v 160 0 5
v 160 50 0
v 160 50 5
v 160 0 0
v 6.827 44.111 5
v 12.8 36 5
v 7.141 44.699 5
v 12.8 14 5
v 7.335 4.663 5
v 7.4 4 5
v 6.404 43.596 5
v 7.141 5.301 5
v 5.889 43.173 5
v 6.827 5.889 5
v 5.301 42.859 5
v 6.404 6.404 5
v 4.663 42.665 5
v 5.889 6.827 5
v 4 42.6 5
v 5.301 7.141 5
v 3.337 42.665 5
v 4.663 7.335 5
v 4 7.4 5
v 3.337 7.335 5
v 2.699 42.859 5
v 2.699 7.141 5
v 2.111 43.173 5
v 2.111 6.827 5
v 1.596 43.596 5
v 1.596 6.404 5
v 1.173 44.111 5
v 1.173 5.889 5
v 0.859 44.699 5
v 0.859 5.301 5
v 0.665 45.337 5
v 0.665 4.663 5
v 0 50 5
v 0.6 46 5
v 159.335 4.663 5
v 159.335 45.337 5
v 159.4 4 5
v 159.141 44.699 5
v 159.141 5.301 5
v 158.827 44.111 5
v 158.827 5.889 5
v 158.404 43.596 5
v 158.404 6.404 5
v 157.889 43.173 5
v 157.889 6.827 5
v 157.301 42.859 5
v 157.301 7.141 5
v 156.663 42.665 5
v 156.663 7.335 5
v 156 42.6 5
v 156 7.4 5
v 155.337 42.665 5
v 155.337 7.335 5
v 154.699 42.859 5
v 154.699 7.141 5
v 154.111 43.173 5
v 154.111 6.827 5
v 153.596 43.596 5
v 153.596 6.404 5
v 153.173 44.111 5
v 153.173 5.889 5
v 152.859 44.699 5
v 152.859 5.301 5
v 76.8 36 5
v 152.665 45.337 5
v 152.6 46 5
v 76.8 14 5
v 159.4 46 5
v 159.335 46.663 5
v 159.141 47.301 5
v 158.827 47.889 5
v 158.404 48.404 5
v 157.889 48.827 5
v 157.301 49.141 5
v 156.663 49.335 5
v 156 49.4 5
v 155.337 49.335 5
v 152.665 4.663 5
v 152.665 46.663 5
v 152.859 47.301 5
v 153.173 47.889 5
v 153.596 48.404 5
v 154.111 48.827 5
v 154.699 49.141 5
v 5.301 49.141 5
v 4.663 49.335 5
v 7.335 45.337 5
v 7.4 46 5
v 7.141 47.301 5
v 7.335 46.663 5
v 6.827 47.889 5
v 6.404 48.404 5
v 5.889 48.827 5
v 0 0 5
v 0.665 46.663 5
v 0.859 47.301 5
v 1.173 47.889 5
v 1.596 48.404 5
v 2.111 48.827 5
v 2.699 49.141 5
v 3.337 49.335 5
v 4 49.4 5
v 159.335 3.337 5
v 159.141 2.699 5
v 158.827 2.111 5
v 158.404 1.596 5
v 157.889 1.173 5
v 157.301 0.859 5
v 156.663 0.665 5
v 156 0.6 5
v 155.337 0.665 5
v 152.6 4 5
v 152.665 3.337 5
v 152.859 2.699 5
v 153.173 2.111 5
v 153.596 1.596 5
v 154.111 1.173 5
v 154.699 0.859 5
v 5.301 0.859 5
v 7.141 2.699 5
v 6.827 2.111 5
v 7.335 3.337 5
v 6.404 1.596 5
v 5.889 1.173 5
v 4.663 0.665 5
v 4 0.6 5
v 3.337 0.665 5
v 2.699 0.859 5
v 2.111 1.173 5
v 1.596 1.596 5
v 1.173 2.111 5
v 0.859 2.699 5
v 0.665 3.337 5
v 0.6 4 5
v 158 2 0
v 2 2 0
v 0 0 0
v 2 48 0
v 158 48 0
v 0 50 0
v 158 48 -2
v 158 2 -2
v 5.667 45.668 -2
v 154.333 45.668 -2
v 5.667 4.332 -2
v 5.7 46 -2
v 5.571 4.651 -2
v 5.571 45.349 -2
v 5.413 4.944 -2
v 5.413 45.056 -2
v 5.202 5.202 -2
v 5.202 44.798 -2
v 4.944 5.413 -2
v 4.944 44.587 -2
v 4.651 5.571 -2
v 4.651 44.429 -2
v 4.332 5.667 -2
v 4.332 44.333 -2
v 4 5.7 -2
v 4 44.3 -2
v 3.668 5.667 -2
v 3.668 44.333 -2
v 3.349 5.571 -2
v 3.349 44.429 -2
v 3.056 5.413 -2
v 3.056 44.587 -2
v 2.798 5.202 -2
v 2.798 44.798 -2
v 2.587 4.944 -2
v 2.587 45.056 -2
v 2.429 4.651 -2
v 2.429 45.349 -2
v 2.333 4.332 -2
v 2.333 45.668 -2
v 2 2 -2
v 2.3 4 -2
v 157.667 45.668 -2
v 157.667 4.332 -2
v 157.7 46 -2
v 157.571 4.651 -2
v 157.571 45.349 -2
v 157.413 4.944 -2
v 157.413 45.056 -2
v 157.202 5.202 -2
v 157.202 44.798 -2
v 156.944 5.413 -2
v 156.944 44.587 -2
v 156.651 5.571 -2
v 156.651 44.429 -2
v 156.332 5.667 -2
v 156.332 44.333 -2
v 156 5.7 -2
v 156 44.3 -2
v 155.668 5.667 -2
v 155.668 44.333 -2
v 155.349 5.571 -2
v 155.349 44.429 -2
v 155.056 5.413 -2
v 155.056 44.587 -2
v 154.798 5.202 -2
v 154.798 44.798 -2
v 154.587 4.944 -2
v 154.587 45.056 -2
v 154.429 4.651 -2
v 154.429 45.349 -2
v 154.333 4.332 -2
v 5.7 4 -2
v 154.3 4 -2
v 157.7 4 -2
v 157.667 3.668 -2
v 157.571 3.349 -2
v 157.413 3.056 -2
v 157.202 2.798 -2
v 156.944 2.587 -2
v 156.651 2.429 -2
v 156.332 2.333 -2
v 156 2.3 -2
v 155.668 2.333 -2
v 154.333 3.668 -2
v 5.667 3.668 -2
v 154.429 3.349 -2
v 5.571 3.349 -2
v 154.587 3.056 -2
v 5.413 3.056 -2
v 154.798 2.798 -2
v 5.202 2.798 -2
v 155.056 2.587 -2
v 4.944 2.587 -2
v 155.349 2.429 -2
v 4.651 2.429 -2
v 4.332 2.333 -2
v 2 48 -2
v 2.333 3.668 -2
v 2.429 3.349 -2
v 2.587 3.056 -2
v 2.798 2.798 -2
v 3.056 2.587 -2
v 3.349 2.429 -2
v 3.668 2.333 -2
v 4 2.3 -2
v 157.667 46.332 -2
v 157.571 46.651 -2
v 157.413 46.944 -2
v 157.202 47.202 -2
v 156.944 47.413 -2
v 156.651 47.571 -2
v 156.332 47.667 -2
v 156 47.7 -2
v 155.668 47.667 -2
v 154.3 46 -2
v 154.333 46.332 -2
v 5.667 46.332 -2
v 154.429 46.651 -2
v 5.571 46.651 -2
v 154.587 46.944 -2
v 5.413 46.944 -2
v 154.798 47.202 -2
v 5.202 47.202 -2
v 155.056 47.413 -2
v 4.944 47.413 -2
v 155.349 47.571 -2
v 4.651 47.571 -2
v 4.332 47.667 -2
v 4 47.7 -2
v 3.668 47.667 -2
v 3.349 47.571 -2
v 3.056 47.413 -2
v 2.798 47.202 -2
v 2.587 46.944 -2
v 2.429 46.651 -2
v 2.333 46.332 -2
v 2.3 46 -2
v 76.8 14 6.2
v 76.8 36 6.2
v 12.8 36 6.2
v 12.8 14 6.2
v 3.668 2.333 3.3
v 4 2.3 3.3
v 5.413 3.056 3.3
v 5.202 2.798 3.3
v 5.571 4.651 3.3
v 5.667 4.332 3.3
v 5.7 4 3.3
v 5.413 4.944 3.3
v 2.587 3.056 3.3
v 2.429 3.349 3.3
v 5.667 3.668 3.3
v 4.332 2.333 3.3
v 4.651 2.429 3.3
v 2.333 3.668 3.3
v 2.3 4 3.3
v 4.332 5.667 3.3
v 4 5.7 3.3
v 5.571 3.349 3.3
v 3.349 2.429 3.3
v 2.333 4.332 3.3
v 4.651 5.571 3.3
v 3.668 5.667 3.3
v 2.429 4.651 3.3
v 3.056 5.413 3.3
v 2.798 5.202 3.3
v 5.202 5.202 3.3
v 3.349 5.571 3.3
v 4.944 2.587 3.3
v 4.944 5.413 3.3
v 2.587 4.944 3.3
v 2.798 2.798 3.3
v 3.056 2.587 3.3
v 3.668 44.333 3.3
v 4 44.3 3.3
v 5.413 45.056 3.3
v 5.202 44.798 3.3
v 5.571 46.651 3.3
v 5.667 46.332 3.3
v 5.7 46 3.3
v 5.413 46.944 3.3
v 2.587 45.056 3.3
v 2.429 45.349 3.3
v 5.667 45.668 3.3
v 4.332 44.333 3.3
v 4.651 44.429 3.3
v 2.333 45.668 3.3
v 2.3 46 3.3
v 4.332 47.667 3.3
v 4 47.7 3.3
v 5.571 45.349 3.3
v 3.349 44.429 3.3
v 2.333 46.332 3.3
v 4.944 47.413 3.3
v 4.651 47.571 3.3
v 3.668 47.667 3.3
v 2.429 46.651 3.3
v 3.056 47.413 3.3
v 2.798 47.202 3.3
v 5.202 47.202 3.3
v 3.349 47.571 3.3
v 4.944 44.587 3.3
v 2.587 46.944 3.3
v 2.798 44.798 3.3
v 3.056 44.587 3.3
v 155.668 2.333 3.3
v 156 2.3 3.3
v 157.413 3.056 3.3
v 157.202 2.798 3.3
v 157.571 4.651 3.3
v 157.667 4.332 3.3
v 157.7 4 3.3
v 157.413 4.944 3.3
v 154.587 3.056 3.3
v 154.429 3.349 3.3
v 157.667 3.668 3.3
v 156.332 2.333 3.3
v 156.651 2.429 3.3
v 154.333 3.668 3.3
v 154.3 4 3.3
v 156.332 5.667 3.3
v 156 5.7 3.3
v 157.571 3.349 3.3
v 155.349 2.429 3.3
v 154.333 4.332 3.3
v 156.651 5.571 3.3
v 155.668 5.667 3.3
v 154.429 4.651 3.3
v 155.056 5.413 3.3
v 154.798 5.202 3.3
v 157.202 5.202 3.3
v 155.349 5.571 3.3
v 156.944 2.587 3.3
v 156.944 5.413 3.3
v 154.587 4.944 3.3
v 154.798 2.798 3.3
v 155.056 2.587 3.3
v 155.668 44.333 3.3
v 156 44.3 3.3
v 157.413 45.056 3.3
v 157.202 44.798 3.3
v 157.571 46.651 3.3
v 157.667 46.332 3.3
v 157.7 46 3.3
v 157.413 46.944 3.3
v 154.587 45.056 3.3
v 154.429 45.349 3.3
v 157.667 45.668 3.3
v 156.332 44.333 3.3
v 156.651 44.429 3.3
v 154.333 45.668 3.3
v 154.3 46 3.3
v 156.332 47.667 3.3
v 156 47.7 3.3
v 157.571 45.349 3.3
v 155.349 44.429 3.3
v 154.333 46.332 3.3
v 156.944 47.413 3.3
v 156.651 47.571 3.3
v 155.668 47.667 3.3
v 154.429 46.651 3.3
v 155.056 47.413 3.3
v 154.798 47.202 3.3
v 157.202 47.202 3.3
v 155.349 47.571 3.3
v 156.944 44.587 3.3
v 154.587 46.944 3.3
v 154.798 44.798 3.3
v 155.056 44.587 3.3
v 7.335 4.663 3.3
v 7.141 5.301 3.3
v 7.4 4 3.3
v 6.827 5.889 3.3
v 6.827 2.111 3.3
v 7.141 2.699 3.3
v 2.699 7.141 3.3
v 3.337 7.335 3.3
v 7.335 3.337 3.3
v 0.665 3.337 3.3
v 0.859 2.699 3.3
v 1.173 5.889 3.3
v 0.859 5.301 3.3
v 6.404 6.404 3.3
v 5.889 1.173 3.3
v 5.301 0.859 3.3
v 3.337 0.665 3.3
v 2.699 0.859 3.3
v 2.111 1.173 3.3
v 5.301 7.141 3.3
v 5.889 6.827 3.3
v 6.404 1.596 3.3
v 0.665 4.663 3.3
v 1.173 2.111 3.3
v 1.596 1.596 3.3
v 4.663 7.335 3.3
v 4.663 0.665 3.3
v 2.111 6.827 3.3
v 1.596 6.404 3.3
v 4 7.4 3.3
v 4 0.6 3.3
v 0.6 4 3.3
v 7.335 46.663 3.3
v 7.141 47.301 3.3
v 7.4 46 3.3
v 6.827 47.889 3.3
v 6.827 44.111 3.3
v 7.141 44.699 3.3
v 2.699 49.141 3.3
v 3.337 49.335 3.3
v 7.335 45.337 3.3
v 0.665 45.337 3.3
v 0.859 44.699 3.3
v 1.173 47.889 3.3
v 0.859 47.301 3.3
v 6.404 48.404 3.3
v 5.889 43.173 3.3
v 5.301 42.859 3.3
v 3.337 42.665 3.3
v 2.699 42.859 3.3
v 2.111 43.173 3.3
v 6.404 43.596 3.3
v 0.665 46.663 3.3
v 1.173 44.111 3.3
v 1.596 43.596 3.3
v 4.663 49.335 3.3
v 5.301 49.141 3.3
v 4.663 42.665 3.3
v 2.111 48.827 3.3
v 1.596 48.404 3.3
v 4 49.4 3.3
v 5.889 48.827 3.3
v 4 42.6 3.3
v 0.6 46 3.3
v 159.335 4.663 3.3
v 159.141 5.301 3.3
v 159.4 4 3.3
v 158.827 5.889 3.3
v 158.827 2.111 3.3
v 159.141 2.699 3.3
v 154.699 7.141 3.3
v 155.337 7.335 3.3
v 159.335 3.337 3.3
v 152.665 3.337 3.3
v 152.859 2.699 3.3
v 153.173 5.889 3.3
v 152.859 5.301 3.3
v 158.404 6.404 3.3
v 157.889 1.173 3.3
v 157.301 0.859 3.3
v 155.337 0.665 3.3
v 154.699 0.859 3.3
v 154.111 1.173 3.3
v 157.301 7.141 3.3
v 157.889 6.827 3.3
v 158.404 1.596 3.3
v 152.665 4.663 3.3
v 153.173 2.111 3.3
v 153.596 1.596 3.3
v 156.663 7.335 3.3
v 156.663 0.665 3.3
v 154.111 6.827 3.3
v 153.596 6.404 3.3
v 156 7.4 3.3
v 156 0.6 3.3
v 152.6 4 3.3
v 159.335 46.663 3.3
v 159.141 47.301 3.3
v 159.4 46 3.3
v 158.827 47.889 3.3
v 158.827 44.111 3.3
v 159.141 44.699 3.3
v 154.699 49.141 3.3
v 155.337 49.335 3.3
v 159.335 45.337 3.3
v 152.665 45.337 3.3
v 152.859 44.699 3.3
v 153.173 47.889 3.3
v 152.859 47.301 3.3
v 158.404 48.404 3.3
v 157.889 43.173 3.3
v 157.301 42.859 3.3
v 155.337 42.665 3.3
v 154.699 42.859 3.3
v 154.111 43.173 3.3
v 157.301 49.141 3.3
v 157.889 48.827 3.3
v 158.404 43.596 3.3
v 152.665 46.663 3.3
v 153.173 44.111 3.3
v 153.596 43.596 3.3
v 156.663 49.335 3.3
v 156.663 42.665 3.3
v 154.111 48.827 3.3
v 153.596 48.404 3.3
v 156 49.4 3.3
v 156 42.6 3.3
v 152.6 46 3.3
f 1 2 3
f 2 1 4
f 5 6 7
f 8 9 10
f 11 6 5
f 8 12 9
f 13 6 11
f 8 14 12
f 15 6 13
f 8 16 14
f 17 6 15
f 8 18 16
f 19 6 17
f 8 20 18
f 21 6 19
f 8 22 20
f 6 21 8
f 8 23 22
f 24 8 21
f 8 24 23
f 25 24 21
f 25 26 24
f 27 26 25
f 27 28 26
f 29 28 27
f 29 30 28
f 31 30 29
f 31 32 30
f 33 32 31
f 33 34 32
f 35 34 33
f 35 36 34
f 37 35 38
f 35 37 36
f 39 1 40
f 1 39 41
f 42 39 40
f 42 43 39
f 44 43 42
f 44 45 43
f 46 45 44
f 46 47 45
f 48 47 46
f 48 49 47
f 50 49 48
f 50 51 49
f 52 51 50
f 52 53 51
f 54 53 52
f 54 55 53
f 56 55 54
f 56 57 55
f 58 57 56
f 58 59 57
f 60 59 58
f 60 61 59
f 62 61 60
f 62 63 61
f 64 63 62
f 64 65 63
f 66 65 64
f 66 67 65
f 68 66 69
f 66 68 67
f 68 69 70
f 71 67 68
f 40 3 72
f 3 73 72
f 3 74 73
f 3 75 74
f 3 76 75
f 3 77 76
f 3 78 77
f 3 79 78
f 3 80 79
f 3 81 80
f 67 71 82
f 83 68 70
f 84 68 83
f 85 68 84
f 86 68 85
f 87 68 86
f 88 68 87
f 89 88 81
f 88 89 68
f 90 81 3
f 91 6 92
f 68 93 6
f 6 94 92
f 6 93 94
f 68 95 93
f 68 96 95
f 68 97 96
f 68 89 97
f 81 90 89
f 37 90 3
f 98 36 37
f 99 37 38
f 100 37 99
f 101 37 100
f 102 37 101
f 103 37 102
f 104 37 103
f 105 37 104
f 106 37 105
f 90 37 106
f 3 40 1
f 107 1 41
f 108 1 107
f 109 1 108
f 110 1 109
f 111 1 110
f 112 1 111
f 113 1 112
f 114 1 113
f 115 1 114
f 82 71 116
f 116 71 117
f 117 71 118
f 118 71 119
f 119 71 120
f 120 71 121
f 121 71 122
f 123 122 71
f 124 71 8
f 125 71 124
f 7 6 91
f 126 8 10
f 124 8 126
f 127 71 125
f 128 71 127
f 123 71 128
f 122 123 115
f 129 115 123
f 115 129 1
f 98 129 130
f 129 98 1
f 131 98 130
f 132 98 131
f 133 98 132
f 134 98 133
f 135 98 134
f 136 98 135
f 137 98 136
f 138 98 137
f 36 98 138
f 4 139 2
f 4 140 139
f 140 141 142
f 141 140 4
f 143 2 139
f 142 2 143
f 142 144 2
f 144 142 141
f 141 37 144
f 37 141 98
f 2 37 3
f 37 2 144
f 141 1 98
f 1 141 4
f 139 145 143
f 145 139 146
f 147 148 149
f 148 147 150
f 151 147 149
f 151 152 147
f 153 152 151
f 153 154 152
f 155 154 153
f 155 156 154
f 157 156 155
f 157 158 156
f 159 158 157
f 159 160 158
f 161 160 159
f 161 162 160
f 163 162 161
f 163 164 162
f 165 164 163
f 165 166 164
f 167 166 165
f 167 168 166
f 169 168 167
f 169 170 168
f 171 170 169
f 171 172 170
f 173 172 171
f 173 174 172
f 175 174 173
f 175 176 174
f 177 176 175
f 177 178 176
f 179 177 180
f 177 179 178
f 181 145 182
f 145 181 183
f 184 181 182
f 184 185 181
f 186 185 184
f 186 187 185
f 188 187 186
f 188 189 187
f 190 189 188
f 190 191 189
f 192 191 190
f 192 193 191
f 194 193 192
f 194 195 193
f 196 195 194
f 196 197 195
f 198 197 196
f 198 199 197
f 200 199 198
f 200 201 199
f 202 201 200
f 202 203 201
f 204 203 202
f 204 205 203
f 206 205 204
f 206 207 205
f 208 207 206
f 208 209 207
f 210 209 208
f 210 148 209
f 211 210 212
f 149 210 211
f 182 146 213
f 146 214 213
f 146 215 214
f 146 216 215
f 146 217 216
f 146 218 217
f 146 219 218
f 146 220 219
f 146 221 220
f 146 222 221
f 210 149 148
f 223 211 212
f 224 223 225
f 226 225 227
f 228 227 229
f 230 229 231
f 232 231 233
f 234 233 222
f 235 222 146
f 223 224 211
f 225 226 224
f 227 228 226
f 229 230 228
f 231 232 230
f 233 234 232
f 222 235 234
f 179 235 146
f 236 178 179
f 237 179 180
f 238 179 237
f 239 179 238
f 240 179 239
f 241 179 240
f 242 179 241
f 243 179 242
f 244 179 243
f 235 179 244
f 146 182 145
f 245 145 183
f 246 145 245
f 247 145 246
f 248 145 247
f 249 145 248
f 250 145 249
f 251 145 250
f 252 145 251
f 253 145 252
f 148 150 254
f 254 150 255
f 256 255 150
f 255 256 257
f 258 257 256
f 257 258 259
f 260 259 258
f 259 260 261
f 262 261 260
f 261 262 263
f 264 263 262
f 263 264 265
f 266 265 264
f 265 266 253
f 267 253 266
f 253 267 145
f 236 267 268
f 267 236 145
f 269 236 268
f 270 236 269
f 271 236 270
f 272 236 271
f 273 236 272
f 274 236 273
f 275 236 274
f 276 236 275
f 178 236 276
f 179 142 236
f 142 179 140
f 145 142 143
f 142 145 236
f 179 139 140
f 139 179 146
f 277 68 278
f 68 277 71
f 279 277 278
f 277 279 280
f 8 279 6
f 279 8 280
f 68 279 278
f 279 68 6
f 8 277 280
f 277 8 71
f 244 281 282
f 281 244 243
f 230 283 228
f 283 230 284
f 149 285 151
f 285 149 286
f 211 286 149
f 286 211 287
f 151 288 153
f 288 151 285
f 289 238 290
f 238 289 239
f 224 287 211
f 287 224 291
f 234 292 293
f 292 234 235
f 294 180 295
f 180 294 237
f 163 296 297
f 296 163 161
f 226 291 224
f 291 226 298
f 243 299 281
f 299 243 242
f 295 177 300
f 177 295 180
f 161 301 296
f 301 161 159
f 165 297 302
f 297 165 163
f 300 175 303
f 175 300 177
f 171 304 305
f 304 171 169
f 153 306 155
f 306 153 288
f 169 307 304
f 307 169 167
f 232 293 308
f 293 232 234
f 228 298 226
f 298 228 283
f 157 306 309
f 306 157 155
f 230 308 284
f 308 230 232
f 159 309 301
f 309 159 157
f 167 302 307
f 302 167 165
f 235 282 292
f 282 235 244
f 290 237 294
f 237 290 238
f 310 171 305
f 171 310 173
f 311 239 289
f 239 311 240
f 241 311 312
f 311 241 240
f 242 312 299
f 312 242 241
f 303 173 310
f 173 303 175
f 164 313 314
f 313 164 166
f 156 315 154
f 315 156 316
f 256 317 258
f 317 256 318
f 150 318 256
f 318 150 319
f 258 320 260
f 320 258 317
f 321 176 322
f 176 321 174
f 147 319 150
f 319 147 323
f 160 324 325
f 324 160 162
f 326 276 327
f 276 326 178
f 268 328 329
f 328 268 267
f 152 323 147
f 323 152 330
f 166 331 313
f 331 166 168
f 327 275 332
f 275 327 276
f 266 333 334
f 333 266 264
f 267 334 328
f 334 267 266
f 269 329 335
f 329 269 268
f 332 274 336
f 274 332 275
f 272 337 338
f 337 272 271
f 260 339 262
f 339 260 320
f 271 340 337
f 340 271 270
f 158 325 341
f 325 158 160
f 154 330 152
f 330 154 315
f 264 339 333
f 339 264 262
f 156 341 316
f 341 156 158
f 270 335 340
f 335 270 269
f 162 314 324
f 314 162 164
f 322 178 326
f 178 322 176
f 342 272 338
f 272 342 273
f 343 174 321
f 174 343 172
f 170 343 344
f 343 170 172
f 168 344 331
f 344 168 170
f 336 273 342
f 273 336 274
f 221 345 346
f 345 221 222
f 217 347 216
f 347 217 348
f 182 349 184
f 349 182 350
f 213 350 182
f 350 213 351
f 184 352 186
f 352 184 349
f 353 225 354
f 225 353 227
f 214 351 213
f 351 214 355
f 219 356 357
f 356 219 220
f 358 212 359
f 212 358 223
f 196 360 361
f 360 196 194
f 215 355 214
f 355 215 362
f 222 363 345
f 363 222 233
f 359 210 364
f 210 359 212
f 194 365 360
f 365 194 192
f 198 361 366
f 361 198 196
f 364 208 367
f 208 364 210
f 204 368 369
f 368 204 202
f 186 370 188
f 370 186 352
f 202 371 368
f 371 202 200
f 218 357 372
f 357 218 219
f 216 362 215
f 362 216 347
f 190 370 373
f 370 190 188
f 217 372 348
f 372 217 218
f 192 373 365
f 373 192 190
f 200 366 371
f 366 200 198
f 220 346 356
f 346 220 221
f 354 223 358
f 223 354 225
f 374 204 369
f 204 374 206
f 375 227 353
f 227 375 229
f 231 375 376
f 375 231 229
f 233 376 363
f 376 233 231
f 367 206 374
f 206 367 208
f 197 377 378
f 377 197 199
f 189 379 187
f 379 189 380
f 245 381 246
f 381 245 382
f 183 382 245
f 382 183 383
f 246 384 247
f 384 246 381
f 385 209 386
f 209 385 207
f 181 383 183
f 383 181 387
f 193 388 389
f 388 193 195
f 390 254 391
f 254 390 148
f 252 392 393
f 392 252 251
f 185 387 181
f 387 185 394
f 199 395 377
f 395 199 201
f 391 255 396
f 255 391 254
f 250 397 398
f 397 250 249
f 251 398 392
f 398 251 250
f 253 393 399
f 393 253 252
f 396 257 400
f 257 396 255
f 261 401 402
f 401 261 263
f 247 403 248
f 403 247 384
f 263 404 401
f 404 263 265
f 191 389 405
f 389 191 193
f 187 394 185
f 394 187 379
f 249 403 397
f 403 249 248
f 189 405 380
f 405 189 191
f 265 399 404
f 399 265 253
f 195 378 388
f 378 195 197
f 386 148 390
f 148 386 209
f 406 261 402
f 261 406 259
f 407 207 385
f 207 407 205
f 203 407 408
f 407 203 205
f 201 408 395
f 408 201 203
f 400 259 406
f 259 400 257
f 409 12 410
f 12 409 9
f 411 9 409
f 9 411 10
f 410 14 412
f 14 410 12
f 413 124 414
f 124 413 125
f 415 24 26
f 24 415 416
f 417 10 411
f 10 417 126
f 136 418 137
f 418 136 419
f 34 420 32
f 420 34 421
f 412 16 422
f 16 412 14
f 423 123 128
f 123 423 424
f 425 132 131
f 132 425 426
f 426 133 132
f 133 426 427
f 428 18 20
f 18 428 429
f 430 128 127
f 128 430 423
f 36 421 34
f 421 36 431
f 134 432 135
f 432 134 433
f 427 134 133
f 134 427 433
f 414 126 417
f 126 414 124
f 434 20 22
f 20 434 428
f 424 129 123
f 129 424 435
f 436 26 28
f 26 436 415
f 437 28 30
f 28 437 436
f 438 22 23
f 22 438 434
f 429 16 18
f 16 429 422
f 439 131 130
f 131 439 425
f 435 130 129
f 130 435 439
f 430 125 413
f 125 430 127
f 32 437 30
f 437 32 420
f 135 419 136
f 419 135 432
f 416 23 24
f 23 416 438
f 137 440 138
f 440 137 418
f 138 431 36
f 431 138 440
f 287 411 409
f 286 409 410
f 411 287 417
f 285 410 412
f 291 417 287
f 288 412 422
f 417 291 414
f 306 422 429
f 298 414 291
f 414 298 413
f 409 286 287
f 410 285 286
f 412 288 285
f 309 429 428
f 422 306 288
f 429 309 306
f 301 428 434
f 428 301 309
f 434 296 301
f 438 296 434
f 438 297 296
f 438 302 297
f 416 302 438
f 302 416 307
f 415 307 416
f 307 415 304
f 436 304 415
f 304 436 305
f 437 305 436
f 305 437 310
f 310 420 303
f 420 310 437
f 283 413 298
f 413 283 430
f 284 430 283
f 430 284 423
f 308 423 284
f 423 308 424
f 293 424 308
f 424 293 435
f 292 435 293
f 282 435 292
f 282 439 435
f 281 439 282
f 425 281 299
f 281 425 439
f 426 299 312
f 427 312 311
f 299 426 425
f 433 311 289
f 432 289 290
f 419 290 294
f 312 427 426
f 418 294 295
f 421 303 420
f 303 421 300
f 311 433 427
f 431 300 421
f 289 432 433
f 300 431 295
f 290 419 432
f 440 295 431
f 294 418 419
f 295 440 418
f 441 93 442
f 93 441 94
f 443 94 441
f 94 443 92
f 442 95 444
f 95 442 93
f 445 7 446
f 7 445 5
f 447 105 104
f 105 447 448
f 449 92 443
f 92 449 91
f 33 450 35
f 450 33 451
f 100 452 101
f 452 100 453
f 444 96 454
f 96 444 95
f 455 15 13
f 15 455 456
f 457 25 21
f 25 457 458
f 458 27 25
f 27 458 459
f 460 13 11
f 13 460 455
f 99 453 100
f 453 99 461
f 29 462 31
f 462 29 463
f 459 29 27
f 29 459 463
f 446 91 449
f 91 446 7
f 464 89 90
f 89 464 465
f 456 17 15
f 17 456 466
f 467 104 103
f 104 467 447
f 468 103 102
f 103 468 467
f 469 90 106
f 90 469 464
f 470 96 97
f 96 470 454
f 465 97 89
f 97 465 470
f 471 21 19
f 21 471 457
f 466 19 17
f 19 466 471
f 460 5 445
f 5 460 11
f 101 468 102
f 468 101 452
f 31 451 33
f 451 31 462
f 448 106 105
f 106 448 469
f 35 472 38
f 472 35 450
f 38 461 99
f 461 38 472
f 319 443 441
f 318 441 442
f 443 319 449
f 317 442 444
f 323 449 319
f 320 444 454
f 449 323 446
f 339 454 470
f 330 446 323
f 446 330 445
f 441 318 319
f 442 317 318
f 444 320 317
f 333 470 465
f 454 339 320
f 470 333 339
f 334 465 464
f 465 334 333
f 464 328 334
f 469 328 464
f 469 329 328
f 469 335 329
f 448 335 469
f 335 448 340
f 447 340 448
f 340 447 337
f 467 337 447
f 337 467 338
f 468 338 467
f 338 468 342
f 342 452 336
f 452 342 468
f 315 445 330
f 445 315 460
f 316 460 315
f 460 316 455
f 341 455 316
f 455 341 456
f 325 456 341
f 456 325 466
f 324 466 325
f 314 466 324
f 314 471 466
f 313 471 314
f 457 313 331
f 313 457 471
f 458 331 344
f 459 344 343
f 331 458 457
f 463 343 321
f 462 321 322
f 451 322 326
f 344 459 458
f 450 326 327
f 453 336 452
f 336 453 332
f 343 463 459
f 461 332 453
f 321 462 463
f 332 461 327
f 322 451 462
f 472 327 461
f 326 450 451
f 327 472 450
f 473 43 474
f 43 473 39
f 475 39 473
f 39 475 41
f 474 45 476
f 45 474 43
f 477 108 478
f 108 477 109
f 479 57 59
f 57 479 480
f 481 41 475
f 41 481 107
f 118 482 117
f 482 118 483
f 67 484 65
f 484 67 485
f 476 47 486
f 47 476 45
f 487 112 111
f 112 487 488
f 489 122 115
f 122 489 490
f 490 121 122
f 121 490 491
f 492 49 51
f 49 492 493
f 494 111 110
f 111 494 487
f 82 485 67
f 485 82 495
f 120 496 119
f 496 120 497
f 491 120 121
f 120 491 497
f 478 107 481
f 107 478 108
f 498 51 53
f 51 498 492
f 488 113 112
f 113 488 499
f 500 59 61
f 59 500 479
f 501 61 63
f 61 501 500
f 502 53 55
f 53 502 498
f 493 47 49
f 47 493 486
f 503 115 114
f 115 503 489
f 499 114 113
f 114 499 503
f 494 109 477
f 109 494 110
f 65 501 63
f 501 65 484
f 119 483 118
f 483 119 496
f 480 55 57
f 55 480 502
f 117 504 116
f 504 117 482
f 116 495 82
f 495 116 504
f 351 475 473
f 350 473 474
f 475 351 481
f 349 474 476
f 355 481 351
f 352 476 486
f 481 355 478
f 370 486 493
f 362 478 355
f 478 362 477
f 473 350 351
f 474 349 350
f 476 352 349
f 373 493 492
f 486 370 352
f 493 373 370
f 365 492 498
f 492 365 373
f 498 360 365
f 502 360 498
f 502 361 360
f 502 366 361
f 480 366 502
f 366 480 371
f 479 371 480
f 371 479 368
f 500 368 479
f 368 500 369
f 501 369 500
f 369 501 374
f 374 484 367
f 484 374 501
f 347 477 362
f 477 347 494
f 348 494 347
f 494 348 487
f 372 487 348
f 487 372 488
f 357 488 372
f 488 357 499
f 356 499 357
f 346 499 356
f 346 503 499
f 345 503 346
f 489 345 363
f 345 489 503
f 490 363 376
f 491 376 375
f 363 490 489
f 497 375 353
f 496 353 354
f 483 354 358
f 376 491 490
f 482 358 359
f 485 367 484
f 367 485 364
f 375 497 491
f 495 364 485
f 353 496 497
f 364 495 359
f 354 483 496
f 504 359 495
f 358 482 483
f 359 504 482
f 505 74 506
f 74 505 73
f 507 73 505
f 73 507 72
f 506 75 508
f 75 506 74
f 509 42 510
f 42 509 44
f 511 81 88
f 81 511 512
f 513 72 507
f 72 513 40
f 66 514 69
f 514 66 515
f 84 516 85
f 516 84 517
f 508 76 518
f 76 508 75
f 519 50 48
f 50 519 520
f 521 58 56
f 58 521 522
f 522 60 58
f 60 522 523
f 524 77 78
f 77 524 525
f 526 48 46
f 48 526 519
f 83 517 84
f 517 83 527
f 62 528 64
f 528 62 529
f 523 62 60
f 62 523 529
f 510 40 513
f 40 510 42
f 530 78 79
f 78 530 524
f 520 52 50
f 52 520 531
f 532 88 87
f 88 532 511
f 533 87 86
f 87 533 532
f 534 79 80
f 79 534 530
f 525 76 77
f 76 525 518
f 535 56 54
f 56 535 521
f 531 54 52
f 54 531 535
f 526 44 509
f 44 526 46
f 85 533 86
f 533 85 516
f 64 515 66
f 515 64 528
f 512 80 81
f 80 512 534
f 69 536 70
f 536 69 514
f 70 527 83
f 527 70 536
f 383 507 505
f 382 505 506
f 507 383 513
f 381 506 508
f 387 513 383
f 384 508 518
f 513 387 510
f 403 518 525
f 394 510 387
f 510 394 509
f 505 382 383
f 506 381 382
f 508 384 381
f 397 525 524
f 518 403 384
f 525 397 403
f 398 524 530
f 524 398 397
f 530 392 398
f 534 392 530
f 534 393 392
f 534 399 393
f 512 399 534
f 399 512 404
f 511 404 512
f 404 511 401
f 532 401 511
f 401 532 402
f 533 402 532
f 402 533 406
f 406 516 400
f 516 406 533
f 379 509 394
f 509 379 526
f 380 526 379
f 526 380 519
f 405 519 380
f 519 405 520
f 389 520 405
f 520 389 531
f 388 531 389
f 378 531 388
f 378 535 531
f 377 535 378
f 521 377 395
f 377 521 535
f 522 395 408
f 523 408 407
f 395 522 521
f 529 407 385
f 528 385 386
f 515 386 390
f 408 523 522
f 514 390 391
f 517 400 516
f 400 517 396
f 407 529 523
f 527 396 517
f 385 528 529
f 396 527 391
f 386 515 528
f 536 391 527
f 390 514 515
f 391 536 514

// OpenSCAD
$fn = 32;

// ----------------------------------------------------------------------
// Enclosure lid: 160 x 50 x 5 mm, 4 bolt holes
// ----------------------------------------------------------------------

// --- parameters (mm) ---
length = 160;             // lid length, X
width = 50;               // lid width, Y
plate_t = 5;              // lid plate thickness
bolt_d = 3.4;             // bolt clearance
boss_lip = 4;             // bolt hole inset from the corner
sink = 1;                 // overlap of the lip and ribs into the plate
lip_h = 3;                // lip height below the plate
lip_wall = 2;             // lip wall thickness
cs_d = 6.8;               // countersink diameter
cs_h = 1.7;               // countersink depth
label_h = 1.2;            // raised marking pad

module plate() {
  cube([length, width, plate_t]);
  /* lip that drops into the housing opening, sunk into the plate */
  translate([lip_wall, lip_wall, -lip_h + sink]) cube([length - 2 * lip_wall, width - 2 * lip_wall, lip_h]);
  /* raised marking pad on top, sunk 1 mm into the plate */
  translate([length * 0.08, width * 0.28, plate_t - 1]) cube([length * 0.4, width * 0.44, label_h + 1]);
}

difference() {
  plate();
  /* bolt pattern matching the corner bosses */
  for (sx = [0, 1]) for (sy = [0, 1])
    translate([sx * (length - 2 * boss_lip) + boss_lip, sy * (width - 2 * boss_lip) + boss_lip, -lip_h - 1])
      cylinder(h = plate_t + lip_h + 2, d = bolt_d);
  /* countersinks so the heads sit flush */
  for (sx = [0, 1]) for (sy = [0, 1])
    translate([sx * (length - 2 * boss_lip) + boss_lip, sy * (width - 2 * boss_lip) + boss_lip, plate_t - cs_h])
      cylinder(h = cs_h + 0.5, d = cs_d);
}
